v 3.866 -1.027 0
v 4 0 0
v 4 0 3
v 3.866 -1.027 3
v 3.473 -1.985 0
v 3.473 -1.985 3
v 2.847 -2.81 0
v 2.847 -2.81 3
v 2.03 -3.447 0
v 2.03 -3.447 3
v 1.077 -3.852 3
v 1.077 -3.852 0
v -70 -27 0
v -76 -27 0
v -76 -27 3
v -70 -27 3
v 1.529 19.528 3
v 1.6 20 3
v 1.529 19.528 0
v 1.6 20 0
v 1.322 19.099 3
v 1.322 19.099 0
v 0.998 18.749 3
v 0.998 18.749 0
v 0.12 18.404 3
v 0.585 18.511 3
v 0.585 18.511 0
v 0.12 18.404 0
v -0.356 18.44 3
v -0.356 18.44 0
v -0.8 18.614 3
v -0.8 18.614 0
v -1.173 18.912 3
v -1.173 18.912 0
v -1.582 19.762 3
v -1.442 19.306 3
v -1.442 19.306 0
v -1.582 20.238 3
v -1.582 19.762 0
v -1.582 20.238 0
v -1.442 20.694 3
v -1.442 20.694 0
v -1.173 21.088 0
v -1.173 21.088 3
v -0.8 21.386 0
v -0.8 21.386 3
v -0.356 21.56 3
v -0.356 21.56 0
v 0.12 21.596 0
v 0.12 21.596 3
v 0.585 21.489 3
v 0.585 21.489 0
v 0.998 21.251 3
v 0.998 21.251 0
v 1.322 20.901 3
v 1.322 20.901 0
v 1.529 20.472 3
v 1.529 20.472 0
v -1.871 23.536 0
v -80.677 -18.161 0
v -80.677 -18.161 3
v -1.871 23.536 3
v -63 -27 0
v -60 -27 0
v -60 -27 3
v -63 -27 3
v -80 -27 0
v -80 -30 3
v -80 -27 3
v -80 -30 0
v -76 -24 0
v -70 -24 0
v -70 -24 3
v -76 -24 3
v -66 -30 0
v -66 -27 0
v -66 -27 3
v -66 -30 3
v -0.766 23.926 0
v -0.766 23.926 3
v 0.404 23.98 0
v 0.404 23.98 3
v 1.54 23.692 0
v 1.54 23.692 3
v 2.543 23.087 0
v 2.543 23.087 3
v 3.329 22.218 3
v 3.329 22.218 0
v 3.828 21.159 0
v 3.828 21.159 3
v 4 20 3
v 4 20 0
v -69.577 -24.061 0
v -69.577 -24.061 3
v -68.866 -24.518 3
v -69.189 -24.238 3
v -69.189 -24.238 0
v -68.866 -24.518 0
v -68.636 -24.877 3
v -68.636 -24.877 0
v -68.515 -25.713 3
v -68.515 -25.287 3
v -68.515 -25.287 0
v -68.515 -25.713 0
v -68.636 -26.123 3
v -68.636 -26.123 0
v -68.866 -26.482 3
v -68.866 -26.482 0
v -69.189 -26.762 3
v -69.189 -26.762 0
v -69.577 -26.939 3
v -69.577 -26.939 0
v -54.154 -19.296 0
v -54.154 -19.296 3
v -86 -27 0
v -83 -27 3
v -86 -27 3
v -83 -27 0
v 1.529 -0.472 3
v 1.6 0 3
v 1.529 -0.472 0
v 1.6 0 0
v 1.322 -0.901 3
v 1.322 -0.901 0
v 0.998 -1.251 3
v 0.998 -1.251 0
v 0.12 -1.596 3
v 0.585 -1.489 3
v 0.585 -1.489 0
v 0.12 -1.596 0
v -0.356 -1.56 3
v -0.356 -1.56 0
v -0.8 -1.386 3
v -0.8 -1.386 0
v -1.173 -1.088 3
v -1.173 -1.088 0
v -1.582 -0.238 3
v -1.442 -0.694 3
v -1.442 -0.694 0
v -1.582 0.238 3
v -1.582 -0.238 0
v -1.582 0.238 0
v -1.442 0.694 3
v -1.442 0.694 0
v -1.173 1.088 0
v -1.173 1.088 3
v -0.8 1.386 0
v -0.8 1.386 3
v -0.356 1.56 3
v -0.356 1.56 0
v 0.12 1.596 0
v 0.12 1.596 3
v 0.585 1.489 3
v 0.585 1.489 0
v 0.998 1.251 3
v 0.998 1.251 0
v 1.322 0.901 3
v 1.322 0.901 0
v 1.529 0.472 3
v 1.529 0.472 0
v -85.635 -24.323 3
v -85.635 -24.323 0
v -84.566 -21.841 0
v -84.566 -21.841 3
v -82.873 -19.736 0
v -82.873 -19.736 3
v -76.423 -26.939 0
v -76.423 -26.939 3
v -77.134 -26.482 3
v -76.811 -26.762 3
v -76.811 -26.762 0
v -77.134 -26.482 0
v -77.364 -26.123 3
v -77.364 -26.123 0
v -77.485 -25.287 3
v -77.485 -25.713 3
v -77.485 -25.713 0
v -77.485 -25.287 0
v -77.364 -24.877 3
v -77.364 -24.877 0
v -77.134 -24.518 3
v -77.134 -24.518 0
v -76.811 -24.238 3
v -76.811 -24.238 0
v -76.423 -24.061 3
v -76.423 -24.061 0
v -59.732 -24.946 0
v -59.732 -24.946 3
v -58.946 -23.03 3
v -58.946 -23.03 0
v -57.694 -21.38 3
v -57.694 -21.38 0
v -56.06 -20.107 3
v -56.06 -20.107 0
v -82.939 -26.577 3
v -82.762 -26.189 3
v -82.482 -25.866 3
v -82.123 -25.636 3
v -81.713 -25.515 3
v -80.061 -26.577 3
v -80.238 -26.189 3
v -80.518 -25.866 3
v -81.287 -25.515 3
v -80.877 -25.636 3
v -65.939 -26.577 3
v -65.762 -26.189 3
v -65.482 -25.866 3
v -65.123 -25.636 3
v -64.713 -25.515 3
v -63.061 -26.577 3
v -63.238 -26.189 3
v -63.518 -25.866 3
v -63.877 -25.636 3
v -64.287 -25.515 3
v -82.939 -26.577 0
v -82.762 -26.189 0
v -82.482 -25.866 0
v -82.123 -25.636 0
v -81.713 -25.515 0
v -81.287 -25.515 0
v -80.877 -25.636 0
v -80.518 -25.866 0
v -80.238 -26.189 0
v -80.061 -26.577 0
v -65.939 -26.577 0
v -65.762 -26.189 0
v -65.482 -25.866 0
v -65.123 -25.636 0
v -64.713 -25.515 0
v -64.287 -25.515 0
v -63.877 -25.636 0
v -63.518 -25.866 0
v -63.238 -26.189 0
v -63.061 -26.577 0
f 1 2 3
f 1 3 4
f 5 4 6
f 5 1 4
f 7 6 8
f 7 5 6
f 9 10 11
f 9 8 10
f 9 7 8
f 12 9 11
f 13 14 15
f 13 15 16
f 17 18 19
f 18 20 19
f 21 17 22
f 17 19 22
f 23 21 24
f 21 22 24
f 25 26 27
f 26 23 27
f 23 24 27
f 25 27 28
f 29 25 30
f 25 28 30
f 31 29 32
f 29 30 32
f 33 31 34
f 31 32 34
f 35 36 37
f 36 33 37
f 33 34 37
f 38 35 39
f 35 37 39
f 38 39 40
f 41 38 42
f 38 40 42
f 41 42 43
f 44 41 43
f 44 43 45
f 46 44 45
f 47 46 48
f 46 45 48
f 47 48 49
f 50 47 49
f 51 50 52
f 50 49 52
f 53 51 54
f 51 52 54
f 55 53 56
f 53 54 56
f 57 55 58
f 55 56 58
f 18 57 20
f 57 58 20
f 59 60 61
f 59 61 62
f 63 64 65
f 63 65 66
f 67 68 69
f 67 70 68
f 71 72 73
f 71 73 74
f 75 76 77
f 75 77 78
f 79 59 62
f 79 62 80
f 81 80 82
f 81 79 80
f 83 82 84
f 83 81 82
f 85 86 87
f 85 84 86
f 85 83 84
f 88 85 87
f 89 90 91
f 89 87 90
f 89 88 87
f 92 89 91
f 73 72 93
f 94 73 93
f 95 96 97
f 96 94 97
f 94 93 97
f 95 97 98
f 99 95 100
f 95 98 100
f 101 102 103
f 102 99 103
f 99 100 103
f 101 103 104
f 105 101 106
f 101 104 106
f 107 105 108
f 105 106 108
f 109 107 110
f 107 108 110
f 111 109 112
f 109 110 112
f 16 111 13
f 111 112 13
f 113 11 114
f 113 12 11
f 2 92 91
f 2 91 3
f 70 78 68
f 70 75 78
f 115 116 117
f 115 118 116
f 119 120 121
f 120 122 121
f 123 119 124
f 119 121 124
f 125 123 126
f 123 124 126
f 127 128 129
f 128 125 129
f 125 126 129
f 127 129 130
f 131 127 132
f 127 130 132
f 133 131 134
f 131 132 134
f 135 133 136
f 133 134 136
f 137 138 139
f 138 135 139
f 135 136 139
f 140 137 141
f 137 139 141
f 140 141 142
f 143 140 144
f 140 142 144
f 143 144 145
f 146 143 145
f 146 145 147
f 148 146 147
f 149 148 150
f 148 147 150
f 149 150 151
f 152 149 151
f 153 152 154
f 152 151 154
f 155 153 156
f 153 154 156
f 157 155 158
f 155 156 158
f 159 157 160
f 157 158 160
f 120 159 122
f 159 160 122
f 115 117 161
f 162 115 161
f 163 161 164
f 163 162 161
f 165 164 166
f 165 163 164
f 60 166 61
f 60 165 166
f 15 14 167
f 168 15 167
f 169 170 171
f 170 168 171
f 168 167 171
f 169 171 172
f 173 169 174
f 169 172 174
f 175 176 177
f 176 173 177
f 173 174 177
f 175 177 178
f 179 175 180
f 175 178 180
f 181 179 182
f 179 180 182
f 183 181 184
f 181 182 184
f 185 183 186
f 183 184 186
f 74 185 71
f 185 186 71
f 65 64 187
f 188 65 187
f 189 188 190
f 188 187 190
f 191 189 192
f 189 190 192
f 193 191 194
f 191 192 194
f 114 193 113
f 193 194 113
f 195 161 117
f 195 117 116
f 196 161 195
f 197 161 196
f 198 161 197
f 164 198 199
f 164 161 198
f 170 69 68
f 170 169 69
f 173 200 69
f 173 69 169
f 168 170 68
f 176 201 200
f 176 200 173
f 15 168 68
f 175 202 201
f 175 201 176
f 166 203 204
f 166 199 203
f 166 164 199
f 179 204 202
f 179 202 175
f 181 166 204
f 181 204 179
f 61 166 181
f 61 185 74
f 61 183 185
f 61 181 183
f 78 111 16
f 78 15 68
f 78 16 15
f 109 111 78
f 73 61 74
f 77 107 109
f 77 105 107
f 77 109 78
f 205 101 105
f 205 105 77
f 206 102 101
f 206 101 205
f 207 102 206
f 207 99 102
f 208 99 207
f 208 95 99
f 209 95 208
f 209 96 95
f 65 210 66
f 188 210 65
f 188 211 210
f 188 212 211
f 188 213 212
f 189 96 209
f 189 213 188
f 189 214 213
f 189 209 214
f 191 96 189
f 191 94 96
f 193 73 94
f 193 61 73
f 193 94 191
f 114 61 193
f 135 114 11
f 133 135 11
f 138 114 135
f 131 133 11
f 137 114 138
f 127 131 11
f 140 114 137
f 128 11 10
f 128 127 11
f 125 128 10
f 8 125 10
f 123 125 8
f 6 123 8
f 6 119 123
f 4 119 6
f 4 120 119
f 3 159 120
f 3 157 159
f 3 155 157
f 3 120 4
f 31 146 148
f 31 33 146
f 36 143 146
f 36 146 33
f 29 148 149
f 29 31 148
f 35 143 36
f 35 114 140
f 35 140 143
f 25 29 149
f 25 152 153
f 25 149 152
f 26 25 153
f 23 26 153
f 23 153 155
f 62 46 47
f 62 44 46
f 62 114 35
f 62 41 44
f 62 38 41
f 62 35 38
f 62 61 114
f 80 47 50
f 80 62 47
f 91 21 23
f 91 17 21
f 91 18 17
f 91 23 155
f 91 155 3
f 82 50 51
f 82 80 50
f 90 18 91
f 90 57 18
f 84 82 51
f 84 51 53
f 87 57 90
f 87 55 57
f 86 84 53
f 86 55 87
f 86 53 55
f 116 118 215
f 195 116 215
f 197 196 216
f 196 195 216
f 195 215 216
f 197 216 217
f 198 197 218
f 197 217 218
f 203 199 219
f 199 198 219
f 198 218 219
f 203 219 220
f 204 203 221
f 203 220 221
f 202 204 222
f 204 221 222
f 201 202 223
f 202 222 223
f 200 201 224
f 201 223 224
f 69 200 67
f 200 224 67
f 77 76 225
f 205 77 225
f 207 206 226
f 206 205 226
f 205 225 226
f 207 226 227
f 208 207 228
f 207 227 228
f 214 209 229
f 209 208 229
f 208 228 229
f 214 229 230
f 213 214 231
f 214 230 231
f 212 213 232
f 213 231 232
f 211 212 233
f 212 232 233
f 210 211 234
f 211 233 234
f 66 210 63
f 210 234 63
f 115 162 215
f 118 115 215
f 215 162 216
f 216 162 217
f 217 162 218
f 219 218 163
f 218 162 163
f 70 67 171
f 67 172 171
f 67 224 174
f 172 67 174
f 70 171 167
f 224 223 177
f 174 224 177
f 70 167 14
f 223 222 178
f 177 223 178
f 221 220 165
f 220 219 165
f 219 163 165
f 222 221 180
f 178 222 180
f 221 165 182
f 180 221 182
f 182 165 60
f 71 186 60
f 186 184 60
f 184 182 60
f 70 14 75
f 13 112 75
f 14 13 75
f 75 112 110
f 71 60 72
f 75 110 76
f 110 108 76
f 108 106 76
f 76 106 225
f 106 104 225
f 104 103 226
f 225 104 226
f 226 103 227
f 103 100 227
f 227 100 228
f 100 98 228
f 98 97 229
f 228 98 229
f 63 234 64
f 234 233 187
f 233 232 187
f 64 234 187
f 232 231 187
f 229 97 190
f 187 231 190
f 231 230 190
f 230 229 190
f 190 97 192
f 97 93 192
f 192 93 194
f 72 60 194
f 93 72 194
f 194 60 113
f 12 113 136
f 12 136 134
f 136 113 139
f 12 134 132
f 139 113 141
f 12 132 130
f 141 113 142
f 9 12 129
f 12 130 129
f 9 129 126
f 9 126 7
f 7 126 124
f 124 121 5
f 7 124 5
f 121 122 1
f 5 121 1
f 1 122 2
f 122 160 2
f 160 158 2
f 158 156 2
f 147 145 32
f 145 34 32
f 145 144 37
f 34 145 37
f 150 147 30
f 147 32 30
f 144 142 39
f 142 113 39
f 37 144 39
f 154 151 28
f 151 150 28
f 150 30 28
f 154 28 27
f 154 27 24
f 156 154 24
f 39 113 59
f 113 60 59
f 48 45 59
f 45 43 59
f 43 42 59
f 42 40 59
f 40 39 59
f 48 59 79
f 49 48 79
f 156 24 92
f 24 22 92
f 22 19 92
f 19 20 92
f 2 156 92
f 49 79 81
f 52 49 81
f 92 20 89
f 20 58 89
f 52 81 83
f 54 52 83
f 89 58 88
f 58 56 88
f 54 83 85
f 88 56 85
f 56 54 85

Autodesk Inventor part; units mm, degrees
ref_plane "YZ Plane" through (0, 0, 0) normal (1, 0, 0) x (0, 1, 0)
ref_plane "XZ Plane" through (0, 0, 0) normal (0, 1, 0) x (-1, 0, 0)
ref_plane "XY Plane" through (0, 0, 0) normal (0, 0, 1) x (1, 0, 0)
sketch "スケッチ1" plane through (0, 0, 0) normal (0, 0, 1) x (1, 0, 0)
  line L0 (1.0771, -3.8522) -> (-54.1543, -19.2955)
  line L1 (-60, -27) -> (-63, -27)
  arc A0 (-63, -27) -> (-66, -27) centre (-64.5, -27) ccw
  line L2 (-66, -27) -> (-66, -30)
  line L3 (-66, -30) -> (-80, -30)
  line L4 (-80, -30) -> (-80, -27)
  arc A1 (-80, -27) -> (-83, -27) centre (-81.5, -27) ccw
  line L5 (-83, -27) -> (-86, -27)
  arc A2 (-80.6768, -18.161) -> (-86, -27) centre (-76, -27) ccw
  line L6 (-80.6768, -18.161) -> (-1.8707, 23.5356)
  line L7 (4, 20) -> (4, 0)
  line L8 (-76, -25.5) -> (-70, -25.5) construction
  line L9 (-76, -27) -> (-70, -27)
  line L10 (-70, -24) -> (-76, -24)
  arc A3 (-76, -24) -> (-76, -27) centre (-76, -25.5) ccw
  arc A4 (-70, -27) -> (-70, -24) centre (-70, -25.5) ccw
  circle A5 centre (0, 0) radius 1.6
  circle A6 centre (0, 20) radius 1.6
  arc A7 (1.0771, -3.8522) -> (4, 0) centre (0, 0) ccw
  arc A8 (4, 20) -> (-1.8707, 23.5356) centre (0, 20) ccw
  arc A9 (-54.1543, -19.2955) -> (-60, -27) centre (-52, -27) ccw
  point P0 (-73, -25.5)
  point P1 (-73, -30)
  dimension "d0" = 3
  dimension "d1" = 6
  dimension "d2" = 14
  dimension "d3" = 1.5
  dimension "d4" = 3
  dimension "d5" = 1.5
  dimension "d6" = 3
  dimension "d9" = 3.2
  dimension "d10" = 3.2
  dimension "d13" = 4
  dimension "d14" = 20
  dimension "d15" = 30
  dimension "d16" = 10
  dimension "d19" = 8
  dimension "d20" = 60
extrude "押し出し1" add sketch "スケッチ1" along normal blind 3
equation "\"d6\" = d0"
properties part number "BaseSliderSupport"
